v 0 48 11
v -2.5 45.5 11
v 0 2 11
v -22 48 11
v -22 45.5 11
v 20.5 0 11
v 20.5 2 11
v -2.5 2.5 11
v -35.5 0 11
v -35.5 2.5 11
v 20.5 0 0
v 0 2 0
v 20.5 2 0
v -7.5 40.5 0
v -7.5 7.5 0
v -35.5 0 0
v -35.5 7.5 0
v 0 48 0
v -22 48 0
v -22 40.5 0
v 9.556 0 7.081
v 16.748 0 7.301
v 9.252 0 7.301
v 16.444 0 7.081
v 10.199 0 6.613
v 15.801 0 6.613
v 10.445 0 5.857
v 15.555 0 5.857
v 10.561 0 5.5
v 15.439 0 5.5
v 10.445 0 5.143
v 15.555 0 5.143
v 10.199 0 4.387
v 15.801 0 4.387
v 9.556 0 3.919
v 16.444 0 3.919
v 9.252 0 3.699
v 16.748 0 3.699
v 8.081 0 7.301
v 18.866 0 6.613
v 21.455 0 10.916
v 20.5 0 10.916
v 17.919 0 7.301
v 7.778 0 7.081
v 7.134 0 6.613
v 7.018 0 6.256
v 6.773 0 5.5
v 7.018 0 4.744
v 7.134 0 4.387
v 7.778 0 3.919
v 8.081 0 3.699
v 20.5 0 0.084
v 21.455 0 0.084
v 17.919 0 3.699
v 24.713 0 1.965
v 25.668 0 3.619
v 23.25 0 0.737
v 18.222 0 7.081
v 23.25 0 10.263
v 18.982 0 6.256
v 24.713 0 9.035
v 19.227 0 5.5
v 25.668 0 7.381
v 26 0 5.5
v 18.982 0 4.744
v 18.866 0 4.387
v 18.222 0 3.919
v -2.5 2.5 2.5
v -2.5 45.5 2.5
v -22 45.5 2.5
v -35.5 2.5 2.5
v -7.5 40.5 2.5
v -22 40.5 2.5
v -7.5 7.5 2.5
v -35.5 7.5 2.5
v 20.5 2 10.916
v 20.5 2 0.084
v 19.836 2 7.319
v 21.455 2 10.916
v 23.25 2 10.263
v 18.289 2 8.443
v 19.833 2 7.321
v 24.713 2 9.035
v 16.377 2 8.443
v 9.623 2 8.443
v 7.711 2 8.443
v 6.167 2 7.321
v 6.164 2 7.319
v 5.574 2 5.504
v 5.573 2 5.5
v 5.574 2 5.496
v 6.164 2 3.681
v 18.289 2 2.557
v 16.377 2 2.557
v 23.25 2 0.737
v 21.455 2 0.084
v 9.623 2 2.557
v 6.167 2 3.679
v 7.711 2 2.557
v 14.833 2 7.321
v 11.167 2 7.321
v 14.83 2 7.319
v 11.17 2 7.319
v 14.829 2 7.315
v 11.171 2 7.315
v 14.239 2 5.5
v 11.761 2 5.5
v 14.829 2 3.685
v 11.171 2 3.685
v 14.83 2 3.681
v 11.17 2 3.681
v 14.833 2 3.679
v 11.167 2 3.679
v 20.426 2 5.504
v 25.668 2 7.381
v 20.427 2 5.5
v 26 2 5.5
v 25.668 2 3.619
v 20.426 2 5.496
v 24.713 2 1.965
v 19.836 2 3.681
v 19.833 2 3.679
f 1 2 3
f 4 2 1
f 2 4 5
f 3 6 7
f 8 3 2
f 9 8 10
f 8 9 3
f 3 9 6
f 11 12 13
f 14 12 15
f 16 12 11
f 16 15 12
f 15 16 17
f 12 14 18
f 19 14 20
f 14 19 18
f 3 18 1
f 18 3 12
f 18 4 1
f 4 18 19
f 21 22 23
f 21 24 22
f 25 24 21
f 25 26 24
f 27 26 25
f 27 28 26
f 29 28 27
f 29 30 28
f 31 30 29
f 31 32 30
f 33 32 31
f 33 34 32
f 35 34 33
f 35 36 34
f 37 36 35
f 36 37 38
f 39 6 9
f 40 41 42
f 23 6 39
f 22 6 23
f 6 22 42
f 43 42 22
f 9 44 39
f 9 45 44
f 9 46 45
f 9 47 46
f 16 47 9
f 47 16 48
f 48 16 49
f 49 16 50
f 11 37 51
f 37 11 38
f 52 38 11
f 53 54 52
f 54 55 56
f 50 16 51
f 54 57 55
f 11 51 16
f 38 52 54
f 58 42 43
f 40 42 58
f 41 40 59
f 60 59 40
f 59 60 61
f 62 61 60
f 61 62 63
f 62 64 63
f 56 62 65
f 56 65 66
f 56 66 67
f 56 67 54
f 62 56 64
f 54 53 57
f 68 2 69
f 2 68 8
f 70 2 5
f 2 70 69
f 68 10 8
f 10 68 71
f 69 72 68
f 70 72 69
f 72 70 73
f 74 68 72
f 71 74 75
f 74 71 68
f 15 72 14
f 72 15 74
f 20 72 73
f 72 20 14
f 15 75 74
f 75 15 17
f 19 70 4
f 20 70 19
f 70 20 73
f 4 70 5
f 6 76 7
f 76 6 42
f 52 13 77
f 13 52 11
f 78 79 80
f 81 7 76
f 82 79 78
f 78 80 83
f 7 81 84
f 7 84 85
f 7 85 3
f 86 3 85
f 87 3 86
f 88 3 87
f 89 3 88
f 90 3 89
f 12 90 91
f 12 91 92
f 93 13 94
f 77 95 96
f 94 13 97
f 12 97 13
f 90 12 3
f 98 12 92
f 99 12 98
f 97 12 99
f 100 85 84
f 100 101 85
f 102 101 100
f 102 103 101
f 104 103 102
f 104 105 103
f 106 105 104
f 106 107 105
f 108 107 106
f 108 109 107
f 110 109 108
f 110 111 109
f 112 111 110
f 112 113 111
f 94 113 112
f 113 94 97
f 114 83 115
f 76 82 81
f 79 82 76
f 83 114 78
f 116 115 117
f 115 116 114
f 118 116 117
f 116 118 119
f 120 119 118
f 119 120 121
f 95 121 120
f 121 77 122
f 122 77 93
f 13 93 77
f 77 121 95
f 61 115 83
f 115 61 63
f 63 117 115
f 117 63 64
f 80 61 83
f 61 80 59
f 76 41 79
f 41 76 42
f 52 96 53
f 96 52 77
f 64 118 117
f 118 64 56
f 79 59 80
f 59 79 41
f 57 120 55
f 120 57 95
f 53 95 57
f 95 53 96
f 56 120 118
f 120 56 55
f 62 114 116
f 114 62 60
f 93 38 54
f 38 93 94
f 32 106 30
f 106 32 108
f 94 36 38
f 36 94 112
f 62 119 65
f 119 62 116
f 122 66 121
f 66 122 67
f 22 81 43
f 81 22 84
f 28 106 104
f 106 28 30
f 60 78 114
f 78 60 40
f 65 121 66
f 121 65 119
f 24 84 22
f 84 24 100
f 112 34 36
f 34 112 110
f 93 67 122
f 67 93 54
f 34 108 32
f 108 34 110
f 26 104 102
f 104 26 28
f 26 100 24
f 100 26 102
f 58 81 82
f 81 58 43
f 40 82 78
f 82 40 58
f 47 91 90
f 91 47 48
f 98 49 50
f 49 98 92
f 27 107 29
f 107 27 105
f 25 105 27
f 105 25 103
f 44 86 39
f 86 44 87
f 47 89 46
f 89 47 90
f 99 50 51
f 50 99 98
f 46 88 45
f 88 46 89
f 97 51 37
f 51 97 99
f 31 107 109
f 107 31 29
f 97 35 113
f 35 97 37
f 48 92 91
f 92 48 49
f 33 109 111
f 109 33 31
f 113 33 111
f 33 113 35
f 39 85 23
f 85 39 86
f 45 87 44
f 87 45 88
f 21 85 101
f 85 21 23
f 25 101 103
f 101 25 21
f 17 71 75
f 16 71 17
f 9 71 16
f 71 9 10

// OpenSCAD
// file: cord_org.scad
module rim(inner_cube, thickness=2){
  //cube([48, 33, 15]);
  difference(){
      cube(inner_cube + [thickness * 2, thickness * 2, 0]);
      translate([thickness, thickness, -0.5 * thickness]) cube(inner_cube + [0, 0, thickness]);
      }
}

module screw_tab(x, y, z){
   block_x = x - y / 2;  // because round end extends by radius
   
   cube([block_x, y, z]);
   translate([block_x, y/2, 0]) cylinder(r = y / 2, h=z);
}


module screw(r1, r2, h, h_head){
    shaft_h = h - h_head;

    if (shaft_h > 0){
        cylinder(r=r2, h=shaft_h);
    }else{
        h_head = h;
    }
    translate([0, 0, shaft_h]) cylinder(r1=r2, r2=r1, h=h_head);
}

module one_screw_tab(x, y, z, h_head=2.5, r1=3, r2=1.5){
    difference(){
        screw_tab(x, y, z);
        translate([x - y/2, y / 2, -0.01]) screw(r1, r2, z + 0.02, h_head);
    }
}
// main file
include<cord_org.scad>


x_in = 66;
thickness = 2.5;
x_out = x_in + thickness * 2;
x_slot = 27;
//z = 20;
//height = 41;
bottom = 5;
//multi (y needs more buffer, little space before outlets begin)
z = 11;
height=43;

module two_screw_tab(x, y, z, h_head=2.5, r1=3.1, r2=1.6){
    difference(){
        screw_tab(x, y, z);
        union(){
            translate([x * 2/3, y / 2, -0.01]) screw(r1, r2, z + 0.02, h_head);
            translate([x * 1/3, y / 2, -0.01]) screw(r1, r2, z + 0.02, h_head);
        }
    }
}


module whole(b_supp=true){

difference(){
    union(){
        rim([x_in, height, z], thickness);
        // bottom piece only
        if (b_supp){
            rim([x_in - bottom * 2, height - bottom * 2, thickness], thickness + bottom);
        }
    }
    // opening away from attachment surface, 
    // e.g. for cord to come through
    translate([x_in / 2 - x_slot / 2 + thickness, bottom + thickness, -0.5]){
        cube([x_slot, height + 7, z + 1]);
    }
}

translate([x_out, 0, z]){
    rotate([-90, 0, 0]) two_screw_tab(26, z, 2);
}

rotate([90, 0, 180]) two_screw_tab(26, z, 2);
}

module left(b_supp=true){
epsilon = 0.05;
difference(){
    whole(b_supp);
    translate([x_out / 2, -epsilon, -epsilon]) cube([x_out + epsilon, height + thickness * 2 + epsilon, z + epsilon]);
}
}

//left();
//mirror([1,0,0]) left();
//left(false);


//left(true);
mirror([1,0,0]) left(true);
//two_screw_tab(40,20,100);
